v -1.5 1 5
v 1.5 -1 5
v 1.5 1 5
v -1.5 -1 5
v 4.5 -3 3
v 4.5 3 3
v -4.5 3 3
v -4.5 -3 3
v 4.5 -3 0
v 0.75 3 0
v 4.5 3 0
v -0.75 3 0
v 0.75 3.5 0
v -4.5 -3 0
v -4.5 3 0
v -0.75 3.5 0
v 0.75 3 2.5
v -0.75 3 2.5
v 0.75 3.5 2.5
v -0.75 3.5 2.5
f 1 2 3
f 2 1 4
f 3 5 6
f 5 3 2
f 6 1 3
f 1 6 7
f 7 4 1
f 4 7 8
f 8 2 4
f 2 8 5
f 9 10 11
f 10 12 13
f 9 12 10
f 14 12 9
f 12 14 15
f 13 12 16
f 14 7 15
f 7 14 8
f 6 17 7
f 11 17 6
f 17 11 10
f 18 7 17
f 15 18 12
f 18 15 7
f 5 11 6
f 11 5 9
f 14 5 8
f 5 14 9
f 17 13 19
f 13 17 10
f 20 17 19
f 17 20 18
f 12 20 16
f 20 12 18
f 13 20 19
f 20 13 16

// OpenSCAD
translate([0,0,5]) {
    rotate(a=[0,180,0]) {
        color("red")
        linear_extrude(height = 2, scale=3) 
        square ([3,2],center = true);
    }
};

translate([0,0,0]) {
    color("gray")
    linear_extrude(height = 3)
    square ([9,6],center = true);
};

translate([-0.75,3,0]) {
    cube([1.5,0.5,2.5]);
};


translate([2.5,3,1]) {
    rotate(a=[90,0,0]) {
        polygon(points=[[0,0],[0,1],[0.5,1.5],[1,1],[1,0]]);
    }
}

translate([-3,3,1]) {
    rotate(a=[90,0,0]) {
        polygon(points=[[0,0],[0,1],[0.5,1.5],[1,1],[1,0]]);
    }
}
